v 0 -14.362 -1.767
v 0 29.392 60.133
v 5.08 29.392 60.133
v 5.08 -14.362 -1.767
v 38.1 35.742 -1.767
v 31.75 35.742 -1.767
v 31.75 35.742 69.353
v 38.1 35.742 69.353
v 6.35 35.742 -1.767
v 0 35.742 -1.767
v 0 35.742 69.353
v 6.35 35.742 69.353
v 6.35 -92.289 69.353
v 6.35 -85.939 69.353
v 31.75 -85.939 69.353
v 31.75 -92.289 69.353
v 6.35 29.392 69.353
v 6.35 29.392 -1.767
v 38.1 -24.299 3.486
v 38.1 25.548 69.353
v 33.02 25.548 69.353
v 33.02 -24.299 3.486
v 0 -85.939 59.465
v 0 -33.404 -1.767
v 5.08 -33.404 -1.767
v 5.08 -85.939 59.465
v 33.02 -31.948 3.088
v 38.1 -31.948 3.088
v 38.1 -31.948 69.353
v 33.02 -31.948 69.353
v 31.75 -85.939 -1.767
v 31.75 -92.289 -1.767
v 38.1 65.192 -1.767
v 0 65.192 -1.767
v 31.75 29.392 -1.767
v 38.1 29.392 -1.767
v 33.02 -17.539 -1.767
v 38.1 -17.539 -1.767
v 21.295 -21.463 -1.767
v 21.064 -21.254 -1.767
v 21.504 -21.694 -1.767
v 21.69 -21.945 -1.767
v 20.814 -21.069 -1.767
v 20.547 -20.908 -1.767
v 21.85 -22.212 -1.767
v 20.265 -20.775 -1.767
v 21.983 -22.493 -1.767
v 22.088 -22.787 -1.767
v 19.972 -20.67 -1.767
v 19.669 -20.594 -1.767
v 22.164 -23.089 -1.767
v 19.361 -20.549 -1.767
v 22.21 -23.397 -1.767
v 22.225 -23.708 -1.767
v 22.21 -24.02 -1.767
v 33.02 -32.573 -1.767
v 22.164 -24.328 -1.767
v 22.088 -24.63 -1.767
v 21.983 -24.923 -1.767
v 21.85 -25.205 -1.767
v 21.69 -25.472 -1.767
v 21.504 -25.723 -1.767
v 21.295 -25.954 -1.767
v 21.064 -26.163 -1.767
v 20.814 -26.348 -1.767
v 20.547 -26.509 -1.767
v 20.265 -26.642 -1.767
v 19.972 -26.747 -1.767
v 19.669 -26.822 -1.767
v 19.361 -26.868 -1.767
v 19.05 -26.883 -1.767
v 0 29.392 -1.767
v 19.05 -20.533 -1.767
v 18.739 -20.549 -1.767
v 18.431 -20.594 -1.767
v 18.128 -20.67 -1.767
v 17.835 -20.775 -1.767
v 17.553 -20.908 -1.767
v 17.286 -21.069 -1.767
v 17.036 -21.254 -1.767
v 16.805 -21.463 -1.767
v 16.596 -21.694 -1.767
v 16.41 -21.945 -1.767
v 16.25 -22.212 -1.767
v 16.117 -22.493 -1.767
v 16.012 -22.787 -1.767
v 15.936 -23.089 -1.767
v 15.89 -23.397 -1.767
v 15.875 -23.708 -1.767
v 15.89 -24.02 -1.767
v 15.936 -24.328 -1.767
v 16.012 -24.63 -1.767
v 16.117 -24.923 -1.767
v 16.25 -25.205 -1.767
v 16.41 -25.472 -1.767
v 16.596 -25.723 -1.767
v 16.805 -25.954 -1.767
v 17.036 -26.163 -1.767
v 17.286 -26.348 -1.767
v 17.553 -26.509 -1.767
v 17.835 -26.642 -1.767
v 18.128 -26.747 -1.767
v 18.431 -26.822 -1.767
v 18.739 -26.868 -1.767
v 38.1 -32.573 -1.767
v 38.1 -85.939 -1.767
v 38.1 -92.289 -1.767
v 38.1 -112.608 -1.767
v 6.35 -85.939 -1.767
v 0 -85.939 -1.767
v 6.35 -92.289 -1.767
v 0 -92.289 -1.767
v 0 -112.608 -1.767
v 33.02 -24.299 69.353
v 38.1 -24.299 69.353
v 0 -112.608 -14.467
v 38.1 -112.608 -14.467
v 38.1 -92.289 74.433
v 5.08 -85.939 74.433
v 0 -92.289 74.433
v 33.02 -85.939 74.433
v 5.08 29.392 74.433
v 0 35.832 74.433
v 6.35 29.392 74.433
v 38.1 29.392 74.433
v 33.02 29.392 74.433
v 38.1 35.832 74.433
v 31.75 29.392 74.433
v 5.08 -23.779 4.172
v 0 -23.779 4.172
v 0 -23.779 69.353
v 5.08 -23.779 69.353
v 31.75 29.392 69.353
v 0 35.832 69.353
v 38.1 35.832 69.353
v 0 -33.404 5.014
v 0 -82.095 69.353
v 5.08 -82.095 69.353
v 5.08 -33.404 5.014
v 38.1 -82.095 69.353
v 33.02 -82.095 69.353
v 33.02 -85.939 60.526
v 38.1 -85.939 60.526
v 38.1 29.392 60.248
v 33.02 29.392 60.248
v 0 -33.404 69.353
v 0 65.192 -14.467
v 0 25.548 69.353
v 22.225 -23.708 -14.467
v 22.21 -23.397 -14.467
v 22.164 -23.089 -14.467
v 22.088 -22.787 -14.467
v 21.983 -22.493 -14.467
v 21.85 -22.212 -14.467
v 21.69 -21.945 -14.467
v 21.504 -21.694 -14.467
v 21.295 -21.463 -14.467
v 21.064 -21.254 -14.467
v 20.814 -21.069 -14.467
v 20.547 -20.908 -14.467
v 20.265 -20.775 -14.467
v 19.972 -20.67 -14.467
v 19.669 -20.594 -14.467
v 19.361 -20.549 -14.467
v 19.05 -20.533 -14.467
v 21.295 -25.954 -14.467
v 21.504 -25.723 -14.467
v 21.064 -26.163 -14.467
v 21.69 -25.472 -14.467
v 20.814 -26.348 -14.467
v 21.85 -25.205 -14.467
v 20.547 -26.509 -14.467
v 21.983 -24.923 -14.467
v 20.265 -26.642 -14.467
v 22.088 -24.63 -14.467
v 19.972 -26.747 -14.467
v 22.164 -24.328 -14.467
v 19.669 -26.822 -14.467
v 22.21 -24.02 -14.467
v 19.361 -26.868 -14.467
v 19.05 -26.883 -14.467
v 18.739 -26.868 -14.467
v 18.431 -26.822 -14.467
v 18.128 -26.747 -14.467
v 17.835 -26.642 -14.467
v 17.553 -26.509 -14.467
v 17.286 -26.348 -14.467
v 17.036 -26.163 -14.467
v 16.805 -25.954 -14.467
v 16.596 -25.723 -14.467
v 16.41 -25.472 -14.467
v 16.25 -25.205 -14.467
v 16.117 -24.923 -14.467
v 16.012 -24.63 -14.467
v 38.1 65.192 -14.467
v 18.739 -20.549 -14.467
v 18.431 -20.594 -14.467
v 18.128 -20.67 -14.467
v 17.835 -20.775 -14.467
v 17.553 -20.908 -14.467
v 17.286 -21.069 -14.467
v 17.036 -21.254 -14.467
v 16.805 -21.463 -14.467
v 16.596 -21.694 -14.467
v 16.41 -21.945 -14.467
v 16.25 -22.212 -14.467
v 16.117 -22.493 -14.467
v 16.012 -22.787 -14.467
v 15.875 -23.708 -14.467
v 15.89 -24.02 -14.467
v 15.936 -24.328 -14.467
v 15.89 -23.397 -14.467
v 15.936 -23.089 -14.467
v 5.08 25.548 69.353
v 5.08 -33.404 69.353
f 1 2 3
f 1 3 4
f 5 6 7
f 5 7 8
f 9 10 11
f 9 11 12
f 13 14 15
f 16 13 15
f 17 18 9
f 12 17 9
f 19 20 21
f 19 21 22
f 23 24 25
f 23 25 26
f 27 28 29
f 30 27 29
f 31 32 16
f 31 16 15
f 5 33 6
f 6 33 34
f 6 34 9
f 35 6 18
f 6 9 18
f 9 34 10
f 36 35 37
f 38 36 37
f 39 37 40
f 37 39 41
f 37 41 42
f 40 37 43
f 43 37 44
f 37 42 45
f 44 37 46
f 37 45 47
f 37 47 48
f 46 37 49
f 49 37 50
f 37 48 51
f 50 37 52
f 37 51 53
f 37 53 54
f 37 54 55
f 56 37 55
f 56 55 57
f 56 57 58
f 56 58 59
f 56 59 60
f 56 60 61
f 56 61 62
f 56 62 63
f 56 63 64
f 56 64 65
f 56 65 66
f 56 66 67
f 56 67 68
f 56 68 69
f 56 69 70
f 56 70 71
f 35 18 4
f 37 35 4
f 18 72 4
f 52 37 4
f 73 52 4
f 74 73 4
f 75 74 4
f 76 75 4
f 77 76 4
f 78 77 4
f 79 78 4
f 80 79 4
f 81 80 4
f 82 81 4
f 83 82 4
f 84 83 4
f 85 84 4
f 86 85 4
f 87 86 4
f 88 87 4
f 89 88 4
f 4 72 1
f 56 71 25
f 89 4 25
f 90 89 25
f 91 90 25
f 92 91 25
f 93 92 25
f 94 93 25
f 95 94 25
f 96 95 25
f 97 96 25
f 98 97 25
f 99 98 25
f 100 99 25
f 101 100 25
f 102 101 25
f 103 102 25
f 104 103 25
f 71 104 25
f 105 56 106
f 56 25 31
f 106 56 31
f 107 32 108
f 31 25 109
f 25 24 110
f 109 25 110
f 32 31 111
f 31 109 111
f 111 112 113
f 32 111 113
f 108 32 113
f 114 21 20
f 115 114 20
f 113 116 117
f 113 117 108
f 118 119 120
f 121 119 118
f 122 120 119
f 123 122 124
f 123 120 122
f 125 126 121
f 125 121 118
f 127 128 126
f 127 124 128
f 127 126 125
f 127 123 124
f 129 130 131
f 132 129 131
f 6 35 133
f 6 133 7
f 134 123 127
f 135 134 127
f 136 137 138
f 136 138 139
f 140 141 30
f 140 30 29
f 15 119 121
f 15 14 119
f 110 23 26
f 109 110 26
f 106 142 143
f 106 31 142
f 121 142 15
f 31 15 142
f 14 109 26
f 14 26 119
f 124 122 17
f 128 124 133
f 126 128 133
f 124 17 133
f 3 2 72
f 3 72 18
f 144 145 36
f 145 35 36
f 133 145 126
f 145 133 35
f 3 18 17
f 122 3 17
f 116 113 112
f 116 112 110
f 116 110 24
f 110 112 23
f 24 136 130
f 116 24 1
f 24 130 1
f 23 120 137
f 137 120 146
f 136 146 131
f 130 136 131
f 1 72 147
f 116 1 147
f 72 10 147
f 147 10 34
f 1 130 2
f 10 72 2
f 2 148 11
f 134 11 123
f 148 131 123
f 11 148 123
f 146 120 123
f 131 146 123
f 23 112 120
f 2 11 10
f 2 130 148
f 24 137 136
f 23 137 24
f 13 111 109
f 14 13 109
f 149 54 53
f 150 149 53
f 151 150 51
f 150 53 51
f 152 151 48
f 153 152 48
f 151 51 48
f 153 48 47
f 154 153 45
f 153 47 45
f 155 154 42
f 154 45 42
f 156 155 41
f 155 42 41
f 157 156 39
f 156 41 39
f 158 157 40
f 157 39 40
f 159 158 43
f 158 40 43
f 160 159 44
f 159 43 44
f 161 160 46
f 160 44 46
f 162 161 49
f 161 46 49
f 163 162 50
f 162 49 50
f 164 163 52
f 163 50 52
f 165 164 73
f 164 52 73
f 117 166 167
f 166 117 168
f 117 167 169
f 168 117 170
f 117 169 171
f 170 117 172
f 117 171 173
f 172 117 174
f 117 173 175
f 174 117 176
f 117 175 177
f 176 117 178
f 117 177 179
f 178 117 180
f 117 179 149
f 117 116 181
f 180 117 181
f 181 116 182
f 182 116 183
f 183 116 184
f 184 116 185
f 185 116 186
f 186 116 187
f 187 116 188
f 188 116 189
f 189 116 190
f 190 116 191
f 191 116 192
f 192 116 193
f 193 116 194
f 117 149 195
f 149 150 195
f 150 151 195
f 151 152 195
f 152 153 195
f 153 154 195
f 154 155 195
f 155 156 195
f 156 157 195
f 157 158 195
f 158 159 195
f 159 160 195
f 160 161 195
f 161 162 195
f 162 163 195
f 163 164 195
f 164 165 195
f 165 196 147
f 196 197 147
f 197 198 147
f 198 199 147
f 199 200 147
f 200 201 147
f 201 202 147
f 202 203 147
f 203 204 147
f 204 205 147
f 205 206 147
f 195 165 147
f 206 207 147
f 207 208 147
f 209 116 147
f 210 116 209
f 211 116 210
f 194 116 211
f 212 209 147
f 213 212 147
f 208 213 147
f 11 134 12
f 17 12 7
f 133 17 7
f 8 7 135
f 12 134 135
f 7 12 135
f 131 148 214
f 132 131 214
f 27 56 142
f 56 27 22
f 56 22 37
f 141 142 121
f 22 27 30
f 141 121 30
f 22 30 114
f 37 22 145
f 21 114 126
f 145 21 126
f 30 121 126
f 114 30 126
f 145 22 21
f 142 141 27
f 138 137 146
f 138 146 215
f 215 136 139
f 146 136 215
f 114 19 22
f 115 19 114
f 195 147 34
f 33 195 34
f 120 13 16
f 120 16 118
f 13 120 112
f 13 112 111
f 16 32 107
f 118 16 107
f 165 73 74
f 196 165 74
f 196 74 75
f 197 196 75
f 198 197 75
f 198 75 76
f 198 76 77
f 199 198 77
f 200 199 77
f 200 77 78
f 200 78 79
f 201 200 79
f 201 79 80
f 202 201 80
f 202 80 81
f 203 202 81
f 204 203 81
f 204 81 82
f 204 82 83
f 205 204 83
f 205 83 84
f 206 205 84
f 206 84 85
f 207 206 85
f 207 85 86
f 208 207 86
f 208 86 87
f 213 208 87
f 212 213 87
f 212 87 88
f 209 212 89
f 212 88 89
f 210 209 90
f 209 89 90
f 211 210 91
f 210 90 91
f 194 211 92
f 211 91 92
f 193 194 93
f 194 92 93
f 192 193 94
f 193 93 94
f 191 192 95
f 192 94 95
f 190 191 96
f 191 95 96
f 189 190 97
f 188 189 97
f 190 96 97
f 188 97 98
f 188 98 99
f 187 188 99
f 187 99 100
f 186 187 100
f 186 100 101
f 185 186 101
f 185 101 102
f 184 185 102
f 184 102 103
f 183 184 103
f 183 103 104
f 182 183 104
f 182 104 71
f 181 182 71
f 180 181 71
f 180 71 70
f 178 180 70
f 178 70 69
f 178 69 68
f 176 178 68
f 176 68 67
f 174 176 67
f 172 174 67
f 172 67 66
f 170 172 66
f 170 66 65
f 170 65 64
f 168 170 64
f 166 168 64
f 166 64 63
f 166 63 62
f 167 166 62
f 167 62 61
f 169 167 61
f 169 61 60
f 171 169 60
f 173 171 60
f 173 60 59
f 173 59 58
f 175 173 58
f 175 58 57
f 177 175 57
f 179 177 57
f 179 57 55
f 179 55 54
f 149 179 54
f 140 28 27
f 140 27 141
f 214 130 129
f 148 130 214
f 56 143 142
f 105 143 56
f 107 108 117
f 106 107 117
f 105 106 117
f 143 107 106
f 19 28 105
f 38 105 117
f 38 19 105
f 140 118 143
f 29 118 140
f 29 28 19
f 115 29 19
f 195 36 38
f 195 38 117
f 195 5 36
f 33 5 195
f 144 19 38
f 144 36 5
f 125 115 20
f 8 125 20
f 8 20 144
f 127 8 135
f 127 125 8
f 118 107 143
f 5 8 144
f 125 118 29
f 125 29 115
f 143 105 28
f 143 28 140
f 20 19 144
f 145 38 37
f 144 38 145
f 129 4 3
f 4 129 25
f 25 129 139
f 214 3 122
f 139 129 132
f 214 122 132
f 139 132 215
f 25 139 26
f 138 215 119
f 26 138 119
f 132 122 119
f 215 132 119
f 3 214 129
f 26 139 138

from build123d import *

# Parameters (mm, degrees)
F0_W      = 127
F0_H      = 12.7
F0_W_2    = 25.4
F1_DEPTH  = 38.1
F2_W      = 6.35
F2_H      = 6.35
F3_DEPTH  = 76.2
F4_W      = 6.35
F4_H      = 14.1849974977
F4_H_2    = 13.9073220724
F5_DEPTH  = 5.08
F7_DEPTH  = 5.08
F9_DEPTH  = 119.634
F10_W     = 31.75
F10_H     = 6.35
F11_DEPTH = 5.08
F12_W     = 38.1
F12_H     = 6.4396932721
F13_DEPTH = 5.08
F14_W     = 5.08
F14_H     = 128.0755363405
F15_DEPTH = 5.08
F16_W     = 5.08
F16_H     = 128.120649606
F17_DEPTH = 5.08
F18_W     = 7.6489634812
F18_H     = 71.12
F19_DEPTH = 5.08
F20_W     = 9.6254386008
F20_H     = 73.2569846961
F21_DEPTH = 5.08


# Not quite as in the source:
# - a feature names something its author has since deleted; it is built from what else it names


with BuildPart() as f1:
    # F0 (on Right) → F1 (new body)
    with BuildSketch(Plane.YZ):
        with Locations((-23.7084774733, -8.1166389743)):
            Rectangle(F0_W, F0_H)
        with Locations((-99.9084774733, -8.1166389743)):
            Rectangle(F0_W_2, F0_H)
        with Locations((52.4915225267, -8.1166389743)):
            Rectangle(F0_W_2, F0_H)
    extrude(amount=F1_DEPTH)

    # F2 (on face) → F3 (join)
    with BuildSketch(Plane.XY.offset(-1.7666389743)):
        with Locations((3.175, 32.5670524418)):
            Rectangle(F2_W, F2_H)
        with Locations((34.925, 32.5670524418)):
            Rectangle(F2_W, F2_H)
        with Locations((3.175, -89.113903892)):
            Rectangle(F2_W, F2_H)
        with Locations((34.925, -89.113903892)):
            Rectangle(F2_W, F2_H)
    extrude(amount=F3_DEPTH)

    # F4 (on face) → F5 (join)
    with BuildSketch(Plane.YZ.offset(38.1)):
        with Locations((32.5670524418, 67.3408622769)):
            Rectangle(F4_W, F4_H)
        with Locations((-89.113903892, 67.4796999895)):
            Rectangle(F4_W, F4_H_2)
        Polygon((29.3920524418, 60.2483635281), (29.3920524418, 74.4333610257), (-28.2734257251, -1.7666389743), (-17.538718855, -1.7666389743), align=None)
        Polygon((-32.572824508, -1.7666389743), (-28.2734257251, -1.7666389743), (-85.938903892, 74.4333610257), (-85.938903892, 60.5260389533), align=None)
    extrude(amount=-F5_DEPTH)

    # F6 (on face) → F7 (join)
    with BuildSketch(Plane(origin=(0, 0, 0), x_dir=(0, -1, 0), z_dir=(-1, 0, 0))):
        Polygon((92.288903892, 59.4646334648), (92.288903892, 74.4333610257), (85.938903892, 74.4333610257), (28.2734257251, -1.7666389743), (33.4044694901, -1.7666389743), (85.938903892, 59.4646334648), align=None)
        Polygon((14.3624190241, -1.7666389743), (28.2734257251, -1.7666389743), (-29.3920524418, 74.4333610257), (-35.7420524418, 74.4333610257), (-35.7420524418, 60.1327754557), (-29.3920524418, 60.1327754557), align=None)
    extrude(amount=-F7_DEPTH)

    # F8 (on face) → F9 (cut)
    with BuildSketch(Plane.XY.offset(-1.7666389743)):
        with BuildLine():
            ThreePointArc((19.05, -20.5334774733), (16.8049359697, -25.9535415035), (22.225, -23.7084774733))
            ThreePointArc((22.225, -23.7084774733), (21.2950640303, -21.463413443), (19.05, -20.5334774733))
        make_face()
    extrude(amount=-F9_DEPTH, mode=Mode.SUBTRACT)

    # F10 (on face) → F11 (join)
    with BuildSketch(Plane.XY.offset(74.4333610257)):
        with Locations((15.875, -89.113903892)):
            Rectangle(F10_W, F10_H)
    extrude(amount=-F11_DEPTH)

    # F12 (on face) → F13 (join)
    with BuildSketch(Plane.XY.offset(74.4333610257)):
        with Locations((19.05, 32.6118990779)):
            Rectangle(F12_W, F12_H)
    extrude(amount=-F13_DEPTH)

    # F14 (on face) → F15 (join)
    with BuildSketch(Plane.XY.offset(74.4333610257)):
        with Locations((2.54, -28.2060224563)):
            Rectangle(F14_W, F14_H)
    extrude(amount=-F15_DEPTH)

    # F16 (on face) → F17 (join)
    with BuildSketch(Plane.XY.offset(74.4333610257)):
        with Locations((35.56, -28.228579089)):
            Rectangle(F16_W, F16_H)
    extrude(amount=-F17_DEPTH)

    # F18 (on face) → F19 (join)
    with BuildSketch(Plane.YZ.offset(38.1)):
        with Locations((-28.123093769, 33.7933610257)):
            Rectangle(F18_W, F18_H)
    extrude(amount=-F19_DEPTH)

    # F20 (on face) → F21 (join)
    with BuildSketch(Plane(origin=(0, 0, 0), x_dir=(0, -1, 0), z_dir=(-1, 0, 0))):
        with Locations((28.5917501897, 32.7248686777)):
            Rectangle(F20_W, F20_H)
    extrude(amount=-F21_DEPTH)


solid = f1.part
